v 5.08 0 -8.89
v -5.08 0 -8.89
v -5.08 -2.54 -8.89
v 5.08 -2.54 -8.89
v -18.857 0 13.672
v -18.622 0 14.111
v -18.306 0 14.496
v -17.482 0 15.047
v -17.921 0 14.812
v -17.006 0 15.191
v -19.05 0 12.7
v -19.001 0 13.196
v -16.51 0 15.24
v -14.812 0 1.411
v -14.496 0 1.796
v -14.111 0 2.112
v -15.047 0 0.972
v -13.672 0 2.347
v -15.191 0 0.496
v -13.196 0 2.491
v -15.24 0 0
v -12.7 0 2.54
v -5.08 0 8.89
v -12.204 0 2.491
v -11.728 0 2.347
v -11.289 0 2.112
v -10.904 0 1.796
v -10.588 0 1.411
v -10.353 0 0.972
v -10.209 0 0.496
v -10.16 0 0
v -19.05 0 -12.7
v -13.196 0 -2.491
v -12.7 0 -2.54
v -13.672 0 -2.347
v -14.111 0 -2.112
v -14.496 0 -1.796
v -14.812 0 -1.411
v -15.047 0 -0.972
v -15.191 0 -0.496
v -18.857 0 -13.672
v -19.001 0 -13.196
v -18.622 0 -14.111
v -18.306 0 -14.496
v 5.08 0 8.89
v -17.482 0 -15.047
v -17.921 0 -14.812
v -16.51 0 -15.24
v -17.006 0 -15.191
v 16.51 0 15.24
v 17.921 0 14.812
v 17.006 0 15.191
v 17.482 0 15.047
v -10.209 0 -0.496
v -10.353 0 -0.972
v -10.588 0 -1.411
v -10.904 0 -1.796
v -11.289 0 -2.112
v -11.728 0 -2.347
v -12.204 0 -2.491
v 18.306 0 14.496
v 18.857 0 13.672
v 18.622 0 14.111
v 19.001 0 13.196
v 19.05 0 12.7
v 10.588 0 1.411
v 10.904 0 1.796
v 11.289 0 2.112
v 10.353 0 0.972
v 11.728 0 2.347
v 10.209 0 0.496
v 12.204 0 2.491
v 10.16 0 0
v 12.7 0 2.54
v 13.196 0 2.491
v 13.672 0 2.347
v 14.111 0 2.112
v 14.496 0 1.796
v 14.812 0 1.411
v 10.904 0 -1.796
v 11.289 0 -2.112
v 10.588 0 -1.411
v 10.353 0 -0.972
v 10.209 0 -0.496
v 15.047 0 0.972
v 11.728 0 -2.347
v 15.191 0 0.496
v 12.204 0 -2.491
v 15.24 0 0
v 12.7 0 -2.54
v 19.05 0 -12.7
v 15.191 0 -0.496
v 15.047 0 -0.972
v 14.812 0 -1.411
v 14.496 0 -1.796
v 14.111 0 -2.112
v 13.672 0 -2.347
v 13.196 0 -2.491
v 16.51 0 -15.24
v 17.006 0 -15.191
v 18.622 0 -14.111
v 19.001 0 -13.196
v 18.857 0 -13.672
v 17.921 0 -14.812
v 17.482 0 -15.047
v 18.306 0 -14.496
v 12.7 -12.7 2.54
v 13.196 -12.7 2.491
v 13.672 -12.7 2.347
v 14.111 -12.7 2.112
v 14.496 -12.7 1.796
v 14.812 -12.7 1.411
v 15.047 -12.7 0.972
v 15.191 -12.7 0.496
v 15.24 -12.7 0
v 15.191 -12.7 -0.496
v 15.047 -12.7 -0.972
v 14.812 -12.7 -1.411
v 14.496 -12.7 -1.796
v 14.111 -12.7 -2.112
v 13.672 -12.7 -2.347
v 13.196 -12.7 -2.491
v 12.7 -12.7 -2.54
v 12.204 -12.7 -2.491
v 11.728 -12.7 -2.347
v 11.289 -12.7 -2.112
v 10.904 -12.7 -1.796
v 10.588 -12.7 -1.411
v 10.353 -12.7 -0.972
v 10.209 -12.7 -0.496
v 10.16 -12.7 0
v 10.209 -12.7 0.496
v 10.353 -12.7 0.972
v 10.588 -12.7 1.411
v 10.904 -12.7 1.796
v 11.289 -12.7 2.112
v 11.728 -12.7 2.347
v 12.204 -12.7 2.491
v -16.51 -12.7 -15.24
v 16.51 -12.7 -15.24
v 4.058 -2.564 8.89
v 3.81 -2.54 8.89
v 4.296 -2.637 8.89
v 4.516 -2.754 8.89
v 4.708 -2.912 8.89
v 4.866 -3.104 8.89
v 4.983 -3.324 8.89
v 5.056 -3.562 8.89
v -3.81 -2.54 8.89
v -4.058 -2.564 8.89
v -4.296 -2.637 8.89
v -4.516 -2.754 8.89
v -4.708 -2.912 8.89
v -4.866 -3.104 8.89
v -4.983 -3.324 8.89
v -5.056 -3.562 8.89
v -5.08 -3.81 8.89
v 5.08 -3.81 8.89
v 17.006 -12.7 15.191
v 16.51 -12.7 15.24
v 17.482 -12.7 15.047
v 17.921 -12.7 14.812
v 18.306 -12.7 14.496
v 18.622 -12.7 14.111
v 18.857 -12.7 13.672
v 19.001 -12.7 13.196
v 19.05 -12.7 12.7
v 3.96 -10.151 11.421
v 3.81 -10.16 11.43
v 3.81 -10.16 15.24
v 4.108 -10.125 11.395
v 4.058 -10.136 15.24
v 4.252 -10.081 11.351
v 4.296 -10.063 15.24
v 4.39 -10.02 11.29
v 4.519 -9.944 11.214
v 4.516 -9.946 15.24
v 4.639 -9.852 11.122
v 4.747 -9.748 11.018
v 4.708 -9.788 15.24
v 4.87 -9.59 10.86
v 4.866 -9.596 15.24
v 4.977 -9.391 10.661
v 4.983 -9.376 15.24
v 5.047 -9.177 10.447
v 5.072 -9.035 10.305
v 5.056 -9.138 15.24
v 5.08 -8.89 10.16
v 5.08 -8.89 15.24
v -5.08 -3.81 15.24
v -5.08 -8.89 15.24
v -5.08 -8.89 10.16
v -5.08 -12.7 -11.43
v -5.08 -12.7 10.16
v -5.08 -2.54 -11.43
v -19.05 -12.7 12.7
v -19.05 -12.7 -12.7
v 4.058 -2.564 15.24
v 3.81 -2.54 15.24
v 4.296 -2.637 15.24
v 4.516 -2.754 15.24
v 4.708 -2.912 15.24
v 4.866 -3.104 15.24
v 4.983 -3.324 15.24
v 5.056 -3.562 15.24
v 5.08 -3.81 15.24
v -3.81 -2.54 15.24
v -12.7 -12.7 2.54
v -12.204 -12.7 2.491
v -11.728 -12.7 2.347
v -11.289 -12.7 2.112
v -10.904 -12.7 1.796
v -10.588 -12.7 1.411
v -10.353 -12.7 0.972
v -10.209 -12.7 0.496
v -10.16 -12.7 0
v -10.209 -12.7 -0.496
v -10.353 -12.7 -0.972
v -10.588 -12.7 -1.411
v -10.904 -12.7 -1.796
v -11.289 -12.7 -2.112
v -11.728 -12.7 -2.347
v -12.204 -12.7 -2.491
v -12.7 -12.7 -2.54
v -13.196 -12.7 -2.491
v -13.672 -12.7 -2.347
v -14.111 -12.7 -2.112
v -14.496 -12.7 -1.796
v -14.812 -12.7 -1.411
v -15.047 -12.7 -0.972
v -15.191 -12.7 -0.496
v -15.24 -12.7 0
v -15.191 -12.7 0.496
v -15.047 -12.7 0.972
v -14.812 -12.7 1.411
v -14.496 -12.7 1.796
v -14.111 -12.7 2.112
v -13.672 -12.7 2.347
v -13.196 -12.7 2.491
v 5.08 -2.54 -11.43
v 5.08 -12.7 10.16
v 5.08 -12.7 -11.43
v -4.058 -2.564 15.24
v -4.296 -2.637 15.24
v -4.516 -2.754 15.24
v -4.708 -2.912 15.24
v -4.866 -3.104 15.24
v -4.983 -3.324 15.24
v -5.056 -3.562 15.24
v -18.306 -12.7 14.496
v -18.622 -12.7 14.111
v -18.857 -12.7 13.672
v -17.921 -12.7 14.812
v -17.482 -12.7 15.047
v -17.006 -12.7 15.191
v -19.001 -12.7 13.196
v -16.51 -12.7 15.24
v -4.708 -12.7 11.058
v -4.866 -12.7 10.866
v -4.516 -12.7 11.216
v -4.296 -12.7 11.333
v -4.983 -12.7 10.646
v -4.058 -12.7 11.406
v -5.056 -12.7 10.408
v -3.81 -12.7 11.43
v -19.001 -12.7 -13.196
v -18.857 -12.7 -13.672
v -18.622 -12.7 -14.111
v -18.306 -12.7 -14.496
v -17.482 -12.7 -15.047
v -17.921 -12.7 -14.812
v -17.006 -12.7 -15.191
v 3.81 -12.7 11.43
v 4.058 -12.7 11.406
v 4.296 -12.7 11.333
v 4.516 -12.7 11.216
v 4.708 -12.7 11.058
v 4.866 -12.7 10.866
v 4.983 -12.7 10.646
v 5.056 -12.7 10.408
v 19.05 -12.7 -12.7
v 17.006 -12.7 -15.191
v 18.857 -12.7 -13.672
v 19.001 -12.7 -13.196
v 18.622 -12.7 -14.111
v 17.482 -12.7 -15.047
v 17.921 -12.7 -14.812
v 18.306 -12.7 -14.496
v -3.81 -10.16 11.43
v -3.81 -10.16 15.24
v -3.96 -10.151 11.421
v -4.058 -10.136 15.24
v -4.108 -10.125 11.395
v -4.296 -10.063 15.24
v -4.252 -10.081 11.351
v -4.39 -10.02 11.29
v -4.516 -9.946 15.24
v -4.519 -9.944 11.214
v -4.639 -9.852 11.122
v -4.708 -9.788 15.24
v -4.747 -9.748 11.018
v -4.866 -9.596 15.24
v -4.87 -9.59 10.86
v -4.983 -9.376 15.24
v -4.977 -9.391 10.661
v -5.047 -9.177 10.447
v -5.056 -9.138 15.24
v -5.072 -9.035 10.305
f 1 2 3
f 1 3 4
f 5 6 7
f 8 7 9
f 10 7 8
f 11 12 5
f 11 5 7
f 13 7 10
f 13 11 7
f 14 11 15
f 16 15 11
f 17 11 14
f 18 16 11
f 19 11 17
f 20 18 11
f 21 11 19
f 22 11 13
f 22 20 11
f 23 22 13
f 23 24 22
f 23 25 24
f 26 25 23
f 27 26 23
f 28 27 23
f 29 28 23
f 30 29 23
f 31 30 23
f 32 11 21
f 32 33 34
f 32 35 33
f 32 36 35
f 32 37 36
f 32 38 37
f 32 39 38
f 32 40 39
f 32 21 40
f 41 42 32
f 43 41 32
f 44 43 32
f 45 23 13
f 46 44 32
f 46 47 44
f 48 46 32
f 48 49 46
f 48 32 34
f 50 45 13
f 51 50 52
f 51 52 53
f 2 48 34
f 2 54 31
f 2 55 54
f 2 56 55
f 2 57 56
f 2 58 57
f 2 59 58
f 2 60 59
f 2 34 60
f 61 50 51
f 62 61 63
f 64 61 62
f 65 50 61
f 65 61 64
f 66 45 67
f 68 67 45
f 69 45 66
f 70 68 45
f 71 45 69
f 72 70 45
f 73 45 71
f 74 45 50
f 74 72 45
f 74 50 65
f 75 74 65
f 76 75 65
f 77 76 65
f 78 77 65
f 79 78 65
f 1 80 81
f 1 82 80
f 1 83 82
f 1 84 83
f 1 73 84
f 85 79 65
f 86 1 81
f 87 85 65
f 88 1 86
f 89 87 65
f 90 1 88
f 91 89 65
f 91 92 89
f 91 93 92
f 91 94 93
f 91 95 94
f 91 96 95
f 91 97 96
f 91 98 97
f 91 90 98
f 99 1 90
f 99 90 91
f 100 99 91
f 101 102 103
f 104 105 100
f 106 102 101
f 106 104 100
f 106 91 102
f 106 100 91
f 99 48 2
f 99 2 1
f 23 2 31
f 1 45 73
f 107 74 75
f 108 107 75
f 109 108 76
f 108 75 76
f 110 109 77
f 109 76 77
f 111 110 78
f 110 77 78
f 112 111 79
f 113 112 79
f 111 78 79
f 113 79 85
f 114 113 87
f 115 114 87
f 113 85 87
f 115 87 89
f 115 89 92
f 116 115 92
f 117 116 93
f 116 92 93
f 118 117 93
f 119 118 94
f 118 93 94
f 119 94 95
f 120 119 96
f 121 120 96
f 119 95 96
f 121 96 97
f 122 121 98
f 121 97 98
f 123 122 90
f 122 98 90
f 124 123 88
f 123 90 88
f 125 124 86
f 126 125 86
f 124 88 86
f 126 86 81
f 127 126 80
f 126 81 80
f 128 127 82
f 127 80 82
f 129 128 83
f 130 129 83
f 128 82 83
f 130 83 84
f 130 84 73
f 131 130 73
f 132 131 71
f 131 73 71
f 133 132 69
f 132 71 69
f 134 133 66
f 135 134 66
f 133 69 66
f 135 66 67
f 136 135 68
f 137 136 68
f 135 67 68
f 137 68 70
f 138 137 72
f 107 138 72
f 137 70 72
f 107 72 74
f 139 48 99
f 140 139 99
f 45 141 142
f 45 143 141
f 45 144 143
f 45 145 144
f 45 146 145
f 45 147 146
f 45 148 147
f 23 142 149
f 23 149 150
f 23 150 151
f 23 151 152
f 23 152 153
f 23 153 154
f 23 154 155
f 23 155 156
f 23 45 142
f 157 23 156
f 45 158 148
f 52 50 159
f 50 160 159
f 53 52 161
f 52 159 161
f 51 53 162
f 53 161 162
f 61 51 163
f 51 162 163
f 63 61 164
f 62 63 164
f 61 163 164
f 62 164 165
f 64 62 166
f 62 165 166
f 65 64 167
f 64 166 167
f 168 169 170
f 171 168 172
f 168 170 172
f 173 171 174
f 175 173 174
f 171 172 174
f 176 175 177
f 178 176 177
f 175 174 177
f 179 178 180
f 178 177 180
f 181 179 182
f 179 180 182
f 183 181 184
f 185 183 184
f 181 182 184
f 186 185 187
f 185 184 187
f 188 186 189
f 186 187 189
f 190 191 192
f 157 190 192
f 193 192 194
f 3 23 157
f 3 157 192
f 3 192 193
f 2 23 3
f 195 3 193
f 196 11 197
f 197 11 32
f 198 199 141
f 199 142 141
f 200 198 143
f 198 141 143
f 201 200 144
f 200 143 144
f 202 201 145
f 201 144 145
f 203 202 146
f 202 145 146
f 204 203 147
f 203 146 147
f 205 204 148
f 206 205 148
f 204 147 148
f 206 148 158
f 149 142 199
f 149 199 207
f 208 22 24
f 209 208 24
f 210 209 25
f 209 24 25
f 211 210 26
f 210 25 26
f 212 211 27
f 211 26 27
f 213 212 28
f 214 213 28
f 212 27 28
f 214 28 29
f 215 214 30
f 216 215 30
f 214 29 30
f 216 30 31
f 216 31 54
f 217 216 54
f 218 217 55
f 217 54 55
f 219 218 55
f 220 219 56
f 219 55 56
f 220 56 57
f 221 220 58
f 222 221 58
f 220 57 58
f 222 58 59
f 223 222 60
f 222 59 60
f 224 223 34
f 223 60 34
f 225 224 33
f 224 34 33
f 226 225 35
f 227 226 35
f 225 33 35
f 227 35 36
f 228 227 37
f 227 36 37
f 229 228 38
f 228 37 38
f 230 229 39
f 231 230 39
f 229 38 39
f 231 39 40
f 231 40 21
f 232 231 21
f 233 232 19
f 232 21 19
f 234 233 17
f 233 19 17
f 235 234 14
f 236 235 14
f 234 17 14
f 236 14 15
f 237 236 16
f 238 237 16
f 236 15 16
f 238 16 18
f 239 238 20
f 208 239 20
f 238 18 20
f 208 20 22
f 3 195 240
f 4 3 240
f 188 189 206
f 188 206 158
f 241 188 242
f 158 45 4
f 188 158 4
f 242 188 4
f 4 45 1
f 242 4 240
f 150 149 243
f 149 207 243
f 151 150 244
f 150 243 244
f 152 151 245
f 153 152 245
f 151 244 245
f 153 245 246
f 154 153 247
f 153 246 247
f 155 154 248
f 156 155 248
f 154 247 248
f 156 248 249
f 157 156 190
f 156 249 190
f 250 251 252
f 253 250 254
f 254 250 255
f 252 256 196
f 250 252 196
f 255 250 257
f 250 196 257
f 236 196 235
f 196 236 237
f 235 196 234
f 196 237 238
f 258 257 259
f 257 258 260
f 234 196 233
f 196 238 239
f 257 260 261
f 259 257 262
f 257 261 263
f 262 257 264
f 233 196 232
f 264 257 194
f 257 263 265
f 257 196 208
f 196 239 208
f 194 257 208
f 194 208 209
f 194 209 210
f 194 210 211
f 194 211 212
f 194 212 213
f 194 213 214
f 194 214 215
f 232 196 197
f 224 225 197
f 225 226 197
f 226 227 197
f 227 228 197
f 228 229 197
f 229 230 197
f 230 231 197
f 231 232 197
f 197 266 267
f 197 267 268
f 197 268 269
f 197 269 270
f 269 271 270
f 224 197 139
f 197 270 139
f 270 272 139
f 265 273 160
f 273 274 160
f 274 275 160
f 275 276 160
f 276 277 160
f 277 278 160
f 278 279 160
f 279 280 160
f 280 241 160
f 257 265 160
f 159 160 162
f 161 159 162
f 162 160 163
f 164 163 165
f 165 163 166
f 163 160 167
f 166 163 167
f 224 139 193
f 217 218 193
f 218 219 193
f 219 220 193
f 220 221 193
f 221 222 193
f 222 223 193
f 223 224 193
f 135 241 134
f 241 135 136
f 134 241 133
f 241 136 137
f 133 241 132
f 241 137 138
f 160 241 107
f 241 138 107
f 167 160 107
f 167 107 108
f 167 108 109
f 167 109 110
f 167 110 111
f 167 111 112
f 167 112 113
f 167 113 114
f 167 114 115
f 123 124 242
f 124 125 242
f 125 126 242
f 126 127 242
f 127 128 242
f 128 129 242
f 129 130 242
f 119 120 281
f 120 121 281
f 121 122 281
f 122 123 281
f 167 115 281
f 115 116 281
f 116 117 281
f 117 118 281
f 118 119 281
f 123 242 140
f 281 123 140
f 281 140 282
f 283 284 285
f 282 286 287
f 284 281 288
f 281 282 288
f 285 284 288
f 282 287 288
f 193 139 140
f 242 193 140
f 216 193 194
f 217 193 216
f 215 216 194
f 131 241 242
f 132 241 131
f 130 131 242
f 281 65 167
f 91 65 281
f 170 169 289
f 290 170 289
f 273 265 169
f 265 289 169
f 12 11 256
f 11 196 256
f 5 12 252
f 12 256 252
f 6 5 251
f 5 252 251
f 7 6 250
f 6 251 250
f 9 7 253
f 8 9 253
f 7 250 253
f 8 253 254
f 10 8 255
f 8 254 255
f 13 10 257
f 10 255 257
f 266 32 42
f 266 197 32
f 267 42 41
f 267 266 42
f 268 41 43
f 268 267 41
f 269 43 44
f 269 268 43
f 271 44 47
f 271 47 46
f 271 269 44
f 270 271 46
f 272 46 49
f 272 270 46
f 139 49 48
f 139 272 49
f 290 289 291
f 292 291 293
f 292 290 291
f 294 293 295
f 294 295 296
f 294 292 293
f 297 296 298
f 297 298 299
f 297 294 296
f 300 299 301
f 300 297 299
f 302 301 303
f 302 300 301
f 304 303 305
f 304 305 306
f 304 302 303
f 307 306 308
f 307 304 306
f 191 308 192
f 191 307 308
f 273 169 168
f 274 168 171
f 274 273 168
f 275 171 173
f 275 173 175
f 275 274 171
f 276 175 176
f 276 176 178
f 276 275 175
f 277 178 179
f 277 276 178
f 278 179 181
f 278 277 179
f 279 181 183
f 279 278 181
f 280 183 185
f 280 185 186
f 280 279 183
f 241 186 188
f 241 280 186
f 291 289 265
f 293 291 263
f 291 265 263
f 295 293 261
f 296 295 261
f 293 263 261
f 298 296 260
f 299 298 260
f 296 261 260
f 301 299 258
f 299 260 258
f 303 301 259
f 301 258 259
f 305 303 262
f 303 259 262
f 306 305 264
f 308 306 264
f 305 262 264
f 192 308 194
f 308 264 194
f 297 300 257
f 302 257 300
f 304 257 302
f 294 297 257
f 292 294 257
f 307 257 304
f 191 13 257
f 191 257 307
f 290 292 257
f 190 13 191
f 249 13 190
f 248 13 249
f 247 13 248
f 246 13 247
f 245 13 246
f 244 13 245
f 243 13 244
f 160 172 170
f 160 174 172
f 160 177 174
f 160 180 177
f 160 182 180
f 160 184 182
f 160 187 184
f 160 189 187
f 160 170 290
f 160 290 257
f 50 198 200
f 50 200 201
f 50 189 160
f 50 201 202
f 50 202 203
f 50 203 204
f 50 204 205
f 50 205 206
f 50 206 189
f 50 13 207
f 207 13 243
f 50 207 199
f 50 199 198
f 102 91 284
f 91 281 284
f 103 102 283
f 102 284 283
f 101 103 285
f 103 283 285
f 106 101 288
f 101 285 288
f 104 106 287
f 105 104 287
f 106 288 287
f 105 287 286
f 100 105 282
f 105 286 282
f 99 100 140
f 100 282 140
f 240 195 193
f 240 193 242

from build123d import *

# Parameters (mm, degrees)
SKETCH1_W           = 38.1
SKETCH1_H           = 30.48
SKETCH1_R           = 2.54
SKETCH1_W_2         = 10.16
SKETCH1_H_2         = 22.86
BOSS_EXTRUDE1_DEPTH = 12.7
SKETCH2_W           = 10.16
SKETCH2_H           = 2.54
BOSS_EXTRUDE2_DEPTH = 2.54
SKETCH3_W           = 10.16
SKETCH3_H           = 2.54
BOSS_EXTRUDE3_DEPTH = 2.54
FILLET1_R           = 2.54
SKETCH4_W           = 10.16
SKETCH4_H           = 7.62
CUT_EXTRUDE1_DEPTH  = 36.149415358
FILLET2_R           = 1.27


with BuildPart() as part:
    # Sketch1 → Boss-Extrude1 (new body)
    with BuildSketch(Plane(origin=(0, 0, 0), x_dir=(1, 0, 0), z_dir=(0, 1, 0))):
        Rectangle(SKETCH1_W, SKETCH1_H)
        with Locations(Location((12.7, 0, 0), (0, 0, 270))):
            Circle(SKETCH1_R, mode=Mode.SUBTRACT)
        with Locations(Location((-12.7, 0, 0), (0, 0, 270))):
            Circle(SKETCH1_R, mode=Mode.SUBTRACT)
        Rectangle(SKETCH1_W_2, SKETCH1_H_2, mode=Mode.SUBTRACT)
    extrude(amount=-BOSS_EXTRUDE1_DEPTH)

    # Sketch2 → Boss-Extrude2 (add)
    with BuildSketch(Plane.XY.offset(-11.43)):
        with Locations((0, -1.27)):
            Rectangle(SKETCH2_W, SKETCH2_H)
    extrude(amount=BOSS_EXTRUDE2_DEPTH)

    # Sketch3 → Boss-Extrude3 (add)
    with BuildSketch(Plane(origin=(0, 0, 11.43), x_dir=(-1, 0, 0), z_dir=(0, 0, -1))):
        with Locations((0, -1.27)):
            Rectangle(SKETCH3_W, SKETCH3_H)
    extrude(amount=BOSS_EXTRUDE3_DEPTH)

    # Fillet1
    fillet1_edges = [part.edges().sort_by_distance(p)[0] for p in [
        (19.05, -6.35, 15.24),
        (-19.05, -6.35, 15.24),
        (-19.05, -6.35, -15.24),
        (19.05, -6.35, -15.24),
    ]]
    fillet(fillet1_edges, radius=FILLET1_R)

    # Sketch4 → Cut-Extrude1 (cut, through all)
    with BuildSketch(Plane(origin=(0, 0, 11.43), x_dir=(-1, 0, 0), z_dir=(0, 0, -1))):
        with Locations((0, -6.35)):
            Rectangle(SKETCH4_W, SKETCH4_H)
    extrude(amount=-CUT_EXTRUDE1_DEPTH, mode=Mode.SUBTRACT)

    # Fillet2
    fillet2_edges = [part.edges().sort_by_distance(p)[0] for p in [
        (-5.08, -11.43, 11.43),
        (5.08, -11.43, 11.43),
        (-5.08, -2.54, 12.065),
        (5.08, -2.54, 12.065),
        (5.08, -10.16, 13.335),
        (-5.08, -10.16, 13.335),
    ]]
    fillet(fillet2_edges, radius=FILLET2_R)


solid = part.part
